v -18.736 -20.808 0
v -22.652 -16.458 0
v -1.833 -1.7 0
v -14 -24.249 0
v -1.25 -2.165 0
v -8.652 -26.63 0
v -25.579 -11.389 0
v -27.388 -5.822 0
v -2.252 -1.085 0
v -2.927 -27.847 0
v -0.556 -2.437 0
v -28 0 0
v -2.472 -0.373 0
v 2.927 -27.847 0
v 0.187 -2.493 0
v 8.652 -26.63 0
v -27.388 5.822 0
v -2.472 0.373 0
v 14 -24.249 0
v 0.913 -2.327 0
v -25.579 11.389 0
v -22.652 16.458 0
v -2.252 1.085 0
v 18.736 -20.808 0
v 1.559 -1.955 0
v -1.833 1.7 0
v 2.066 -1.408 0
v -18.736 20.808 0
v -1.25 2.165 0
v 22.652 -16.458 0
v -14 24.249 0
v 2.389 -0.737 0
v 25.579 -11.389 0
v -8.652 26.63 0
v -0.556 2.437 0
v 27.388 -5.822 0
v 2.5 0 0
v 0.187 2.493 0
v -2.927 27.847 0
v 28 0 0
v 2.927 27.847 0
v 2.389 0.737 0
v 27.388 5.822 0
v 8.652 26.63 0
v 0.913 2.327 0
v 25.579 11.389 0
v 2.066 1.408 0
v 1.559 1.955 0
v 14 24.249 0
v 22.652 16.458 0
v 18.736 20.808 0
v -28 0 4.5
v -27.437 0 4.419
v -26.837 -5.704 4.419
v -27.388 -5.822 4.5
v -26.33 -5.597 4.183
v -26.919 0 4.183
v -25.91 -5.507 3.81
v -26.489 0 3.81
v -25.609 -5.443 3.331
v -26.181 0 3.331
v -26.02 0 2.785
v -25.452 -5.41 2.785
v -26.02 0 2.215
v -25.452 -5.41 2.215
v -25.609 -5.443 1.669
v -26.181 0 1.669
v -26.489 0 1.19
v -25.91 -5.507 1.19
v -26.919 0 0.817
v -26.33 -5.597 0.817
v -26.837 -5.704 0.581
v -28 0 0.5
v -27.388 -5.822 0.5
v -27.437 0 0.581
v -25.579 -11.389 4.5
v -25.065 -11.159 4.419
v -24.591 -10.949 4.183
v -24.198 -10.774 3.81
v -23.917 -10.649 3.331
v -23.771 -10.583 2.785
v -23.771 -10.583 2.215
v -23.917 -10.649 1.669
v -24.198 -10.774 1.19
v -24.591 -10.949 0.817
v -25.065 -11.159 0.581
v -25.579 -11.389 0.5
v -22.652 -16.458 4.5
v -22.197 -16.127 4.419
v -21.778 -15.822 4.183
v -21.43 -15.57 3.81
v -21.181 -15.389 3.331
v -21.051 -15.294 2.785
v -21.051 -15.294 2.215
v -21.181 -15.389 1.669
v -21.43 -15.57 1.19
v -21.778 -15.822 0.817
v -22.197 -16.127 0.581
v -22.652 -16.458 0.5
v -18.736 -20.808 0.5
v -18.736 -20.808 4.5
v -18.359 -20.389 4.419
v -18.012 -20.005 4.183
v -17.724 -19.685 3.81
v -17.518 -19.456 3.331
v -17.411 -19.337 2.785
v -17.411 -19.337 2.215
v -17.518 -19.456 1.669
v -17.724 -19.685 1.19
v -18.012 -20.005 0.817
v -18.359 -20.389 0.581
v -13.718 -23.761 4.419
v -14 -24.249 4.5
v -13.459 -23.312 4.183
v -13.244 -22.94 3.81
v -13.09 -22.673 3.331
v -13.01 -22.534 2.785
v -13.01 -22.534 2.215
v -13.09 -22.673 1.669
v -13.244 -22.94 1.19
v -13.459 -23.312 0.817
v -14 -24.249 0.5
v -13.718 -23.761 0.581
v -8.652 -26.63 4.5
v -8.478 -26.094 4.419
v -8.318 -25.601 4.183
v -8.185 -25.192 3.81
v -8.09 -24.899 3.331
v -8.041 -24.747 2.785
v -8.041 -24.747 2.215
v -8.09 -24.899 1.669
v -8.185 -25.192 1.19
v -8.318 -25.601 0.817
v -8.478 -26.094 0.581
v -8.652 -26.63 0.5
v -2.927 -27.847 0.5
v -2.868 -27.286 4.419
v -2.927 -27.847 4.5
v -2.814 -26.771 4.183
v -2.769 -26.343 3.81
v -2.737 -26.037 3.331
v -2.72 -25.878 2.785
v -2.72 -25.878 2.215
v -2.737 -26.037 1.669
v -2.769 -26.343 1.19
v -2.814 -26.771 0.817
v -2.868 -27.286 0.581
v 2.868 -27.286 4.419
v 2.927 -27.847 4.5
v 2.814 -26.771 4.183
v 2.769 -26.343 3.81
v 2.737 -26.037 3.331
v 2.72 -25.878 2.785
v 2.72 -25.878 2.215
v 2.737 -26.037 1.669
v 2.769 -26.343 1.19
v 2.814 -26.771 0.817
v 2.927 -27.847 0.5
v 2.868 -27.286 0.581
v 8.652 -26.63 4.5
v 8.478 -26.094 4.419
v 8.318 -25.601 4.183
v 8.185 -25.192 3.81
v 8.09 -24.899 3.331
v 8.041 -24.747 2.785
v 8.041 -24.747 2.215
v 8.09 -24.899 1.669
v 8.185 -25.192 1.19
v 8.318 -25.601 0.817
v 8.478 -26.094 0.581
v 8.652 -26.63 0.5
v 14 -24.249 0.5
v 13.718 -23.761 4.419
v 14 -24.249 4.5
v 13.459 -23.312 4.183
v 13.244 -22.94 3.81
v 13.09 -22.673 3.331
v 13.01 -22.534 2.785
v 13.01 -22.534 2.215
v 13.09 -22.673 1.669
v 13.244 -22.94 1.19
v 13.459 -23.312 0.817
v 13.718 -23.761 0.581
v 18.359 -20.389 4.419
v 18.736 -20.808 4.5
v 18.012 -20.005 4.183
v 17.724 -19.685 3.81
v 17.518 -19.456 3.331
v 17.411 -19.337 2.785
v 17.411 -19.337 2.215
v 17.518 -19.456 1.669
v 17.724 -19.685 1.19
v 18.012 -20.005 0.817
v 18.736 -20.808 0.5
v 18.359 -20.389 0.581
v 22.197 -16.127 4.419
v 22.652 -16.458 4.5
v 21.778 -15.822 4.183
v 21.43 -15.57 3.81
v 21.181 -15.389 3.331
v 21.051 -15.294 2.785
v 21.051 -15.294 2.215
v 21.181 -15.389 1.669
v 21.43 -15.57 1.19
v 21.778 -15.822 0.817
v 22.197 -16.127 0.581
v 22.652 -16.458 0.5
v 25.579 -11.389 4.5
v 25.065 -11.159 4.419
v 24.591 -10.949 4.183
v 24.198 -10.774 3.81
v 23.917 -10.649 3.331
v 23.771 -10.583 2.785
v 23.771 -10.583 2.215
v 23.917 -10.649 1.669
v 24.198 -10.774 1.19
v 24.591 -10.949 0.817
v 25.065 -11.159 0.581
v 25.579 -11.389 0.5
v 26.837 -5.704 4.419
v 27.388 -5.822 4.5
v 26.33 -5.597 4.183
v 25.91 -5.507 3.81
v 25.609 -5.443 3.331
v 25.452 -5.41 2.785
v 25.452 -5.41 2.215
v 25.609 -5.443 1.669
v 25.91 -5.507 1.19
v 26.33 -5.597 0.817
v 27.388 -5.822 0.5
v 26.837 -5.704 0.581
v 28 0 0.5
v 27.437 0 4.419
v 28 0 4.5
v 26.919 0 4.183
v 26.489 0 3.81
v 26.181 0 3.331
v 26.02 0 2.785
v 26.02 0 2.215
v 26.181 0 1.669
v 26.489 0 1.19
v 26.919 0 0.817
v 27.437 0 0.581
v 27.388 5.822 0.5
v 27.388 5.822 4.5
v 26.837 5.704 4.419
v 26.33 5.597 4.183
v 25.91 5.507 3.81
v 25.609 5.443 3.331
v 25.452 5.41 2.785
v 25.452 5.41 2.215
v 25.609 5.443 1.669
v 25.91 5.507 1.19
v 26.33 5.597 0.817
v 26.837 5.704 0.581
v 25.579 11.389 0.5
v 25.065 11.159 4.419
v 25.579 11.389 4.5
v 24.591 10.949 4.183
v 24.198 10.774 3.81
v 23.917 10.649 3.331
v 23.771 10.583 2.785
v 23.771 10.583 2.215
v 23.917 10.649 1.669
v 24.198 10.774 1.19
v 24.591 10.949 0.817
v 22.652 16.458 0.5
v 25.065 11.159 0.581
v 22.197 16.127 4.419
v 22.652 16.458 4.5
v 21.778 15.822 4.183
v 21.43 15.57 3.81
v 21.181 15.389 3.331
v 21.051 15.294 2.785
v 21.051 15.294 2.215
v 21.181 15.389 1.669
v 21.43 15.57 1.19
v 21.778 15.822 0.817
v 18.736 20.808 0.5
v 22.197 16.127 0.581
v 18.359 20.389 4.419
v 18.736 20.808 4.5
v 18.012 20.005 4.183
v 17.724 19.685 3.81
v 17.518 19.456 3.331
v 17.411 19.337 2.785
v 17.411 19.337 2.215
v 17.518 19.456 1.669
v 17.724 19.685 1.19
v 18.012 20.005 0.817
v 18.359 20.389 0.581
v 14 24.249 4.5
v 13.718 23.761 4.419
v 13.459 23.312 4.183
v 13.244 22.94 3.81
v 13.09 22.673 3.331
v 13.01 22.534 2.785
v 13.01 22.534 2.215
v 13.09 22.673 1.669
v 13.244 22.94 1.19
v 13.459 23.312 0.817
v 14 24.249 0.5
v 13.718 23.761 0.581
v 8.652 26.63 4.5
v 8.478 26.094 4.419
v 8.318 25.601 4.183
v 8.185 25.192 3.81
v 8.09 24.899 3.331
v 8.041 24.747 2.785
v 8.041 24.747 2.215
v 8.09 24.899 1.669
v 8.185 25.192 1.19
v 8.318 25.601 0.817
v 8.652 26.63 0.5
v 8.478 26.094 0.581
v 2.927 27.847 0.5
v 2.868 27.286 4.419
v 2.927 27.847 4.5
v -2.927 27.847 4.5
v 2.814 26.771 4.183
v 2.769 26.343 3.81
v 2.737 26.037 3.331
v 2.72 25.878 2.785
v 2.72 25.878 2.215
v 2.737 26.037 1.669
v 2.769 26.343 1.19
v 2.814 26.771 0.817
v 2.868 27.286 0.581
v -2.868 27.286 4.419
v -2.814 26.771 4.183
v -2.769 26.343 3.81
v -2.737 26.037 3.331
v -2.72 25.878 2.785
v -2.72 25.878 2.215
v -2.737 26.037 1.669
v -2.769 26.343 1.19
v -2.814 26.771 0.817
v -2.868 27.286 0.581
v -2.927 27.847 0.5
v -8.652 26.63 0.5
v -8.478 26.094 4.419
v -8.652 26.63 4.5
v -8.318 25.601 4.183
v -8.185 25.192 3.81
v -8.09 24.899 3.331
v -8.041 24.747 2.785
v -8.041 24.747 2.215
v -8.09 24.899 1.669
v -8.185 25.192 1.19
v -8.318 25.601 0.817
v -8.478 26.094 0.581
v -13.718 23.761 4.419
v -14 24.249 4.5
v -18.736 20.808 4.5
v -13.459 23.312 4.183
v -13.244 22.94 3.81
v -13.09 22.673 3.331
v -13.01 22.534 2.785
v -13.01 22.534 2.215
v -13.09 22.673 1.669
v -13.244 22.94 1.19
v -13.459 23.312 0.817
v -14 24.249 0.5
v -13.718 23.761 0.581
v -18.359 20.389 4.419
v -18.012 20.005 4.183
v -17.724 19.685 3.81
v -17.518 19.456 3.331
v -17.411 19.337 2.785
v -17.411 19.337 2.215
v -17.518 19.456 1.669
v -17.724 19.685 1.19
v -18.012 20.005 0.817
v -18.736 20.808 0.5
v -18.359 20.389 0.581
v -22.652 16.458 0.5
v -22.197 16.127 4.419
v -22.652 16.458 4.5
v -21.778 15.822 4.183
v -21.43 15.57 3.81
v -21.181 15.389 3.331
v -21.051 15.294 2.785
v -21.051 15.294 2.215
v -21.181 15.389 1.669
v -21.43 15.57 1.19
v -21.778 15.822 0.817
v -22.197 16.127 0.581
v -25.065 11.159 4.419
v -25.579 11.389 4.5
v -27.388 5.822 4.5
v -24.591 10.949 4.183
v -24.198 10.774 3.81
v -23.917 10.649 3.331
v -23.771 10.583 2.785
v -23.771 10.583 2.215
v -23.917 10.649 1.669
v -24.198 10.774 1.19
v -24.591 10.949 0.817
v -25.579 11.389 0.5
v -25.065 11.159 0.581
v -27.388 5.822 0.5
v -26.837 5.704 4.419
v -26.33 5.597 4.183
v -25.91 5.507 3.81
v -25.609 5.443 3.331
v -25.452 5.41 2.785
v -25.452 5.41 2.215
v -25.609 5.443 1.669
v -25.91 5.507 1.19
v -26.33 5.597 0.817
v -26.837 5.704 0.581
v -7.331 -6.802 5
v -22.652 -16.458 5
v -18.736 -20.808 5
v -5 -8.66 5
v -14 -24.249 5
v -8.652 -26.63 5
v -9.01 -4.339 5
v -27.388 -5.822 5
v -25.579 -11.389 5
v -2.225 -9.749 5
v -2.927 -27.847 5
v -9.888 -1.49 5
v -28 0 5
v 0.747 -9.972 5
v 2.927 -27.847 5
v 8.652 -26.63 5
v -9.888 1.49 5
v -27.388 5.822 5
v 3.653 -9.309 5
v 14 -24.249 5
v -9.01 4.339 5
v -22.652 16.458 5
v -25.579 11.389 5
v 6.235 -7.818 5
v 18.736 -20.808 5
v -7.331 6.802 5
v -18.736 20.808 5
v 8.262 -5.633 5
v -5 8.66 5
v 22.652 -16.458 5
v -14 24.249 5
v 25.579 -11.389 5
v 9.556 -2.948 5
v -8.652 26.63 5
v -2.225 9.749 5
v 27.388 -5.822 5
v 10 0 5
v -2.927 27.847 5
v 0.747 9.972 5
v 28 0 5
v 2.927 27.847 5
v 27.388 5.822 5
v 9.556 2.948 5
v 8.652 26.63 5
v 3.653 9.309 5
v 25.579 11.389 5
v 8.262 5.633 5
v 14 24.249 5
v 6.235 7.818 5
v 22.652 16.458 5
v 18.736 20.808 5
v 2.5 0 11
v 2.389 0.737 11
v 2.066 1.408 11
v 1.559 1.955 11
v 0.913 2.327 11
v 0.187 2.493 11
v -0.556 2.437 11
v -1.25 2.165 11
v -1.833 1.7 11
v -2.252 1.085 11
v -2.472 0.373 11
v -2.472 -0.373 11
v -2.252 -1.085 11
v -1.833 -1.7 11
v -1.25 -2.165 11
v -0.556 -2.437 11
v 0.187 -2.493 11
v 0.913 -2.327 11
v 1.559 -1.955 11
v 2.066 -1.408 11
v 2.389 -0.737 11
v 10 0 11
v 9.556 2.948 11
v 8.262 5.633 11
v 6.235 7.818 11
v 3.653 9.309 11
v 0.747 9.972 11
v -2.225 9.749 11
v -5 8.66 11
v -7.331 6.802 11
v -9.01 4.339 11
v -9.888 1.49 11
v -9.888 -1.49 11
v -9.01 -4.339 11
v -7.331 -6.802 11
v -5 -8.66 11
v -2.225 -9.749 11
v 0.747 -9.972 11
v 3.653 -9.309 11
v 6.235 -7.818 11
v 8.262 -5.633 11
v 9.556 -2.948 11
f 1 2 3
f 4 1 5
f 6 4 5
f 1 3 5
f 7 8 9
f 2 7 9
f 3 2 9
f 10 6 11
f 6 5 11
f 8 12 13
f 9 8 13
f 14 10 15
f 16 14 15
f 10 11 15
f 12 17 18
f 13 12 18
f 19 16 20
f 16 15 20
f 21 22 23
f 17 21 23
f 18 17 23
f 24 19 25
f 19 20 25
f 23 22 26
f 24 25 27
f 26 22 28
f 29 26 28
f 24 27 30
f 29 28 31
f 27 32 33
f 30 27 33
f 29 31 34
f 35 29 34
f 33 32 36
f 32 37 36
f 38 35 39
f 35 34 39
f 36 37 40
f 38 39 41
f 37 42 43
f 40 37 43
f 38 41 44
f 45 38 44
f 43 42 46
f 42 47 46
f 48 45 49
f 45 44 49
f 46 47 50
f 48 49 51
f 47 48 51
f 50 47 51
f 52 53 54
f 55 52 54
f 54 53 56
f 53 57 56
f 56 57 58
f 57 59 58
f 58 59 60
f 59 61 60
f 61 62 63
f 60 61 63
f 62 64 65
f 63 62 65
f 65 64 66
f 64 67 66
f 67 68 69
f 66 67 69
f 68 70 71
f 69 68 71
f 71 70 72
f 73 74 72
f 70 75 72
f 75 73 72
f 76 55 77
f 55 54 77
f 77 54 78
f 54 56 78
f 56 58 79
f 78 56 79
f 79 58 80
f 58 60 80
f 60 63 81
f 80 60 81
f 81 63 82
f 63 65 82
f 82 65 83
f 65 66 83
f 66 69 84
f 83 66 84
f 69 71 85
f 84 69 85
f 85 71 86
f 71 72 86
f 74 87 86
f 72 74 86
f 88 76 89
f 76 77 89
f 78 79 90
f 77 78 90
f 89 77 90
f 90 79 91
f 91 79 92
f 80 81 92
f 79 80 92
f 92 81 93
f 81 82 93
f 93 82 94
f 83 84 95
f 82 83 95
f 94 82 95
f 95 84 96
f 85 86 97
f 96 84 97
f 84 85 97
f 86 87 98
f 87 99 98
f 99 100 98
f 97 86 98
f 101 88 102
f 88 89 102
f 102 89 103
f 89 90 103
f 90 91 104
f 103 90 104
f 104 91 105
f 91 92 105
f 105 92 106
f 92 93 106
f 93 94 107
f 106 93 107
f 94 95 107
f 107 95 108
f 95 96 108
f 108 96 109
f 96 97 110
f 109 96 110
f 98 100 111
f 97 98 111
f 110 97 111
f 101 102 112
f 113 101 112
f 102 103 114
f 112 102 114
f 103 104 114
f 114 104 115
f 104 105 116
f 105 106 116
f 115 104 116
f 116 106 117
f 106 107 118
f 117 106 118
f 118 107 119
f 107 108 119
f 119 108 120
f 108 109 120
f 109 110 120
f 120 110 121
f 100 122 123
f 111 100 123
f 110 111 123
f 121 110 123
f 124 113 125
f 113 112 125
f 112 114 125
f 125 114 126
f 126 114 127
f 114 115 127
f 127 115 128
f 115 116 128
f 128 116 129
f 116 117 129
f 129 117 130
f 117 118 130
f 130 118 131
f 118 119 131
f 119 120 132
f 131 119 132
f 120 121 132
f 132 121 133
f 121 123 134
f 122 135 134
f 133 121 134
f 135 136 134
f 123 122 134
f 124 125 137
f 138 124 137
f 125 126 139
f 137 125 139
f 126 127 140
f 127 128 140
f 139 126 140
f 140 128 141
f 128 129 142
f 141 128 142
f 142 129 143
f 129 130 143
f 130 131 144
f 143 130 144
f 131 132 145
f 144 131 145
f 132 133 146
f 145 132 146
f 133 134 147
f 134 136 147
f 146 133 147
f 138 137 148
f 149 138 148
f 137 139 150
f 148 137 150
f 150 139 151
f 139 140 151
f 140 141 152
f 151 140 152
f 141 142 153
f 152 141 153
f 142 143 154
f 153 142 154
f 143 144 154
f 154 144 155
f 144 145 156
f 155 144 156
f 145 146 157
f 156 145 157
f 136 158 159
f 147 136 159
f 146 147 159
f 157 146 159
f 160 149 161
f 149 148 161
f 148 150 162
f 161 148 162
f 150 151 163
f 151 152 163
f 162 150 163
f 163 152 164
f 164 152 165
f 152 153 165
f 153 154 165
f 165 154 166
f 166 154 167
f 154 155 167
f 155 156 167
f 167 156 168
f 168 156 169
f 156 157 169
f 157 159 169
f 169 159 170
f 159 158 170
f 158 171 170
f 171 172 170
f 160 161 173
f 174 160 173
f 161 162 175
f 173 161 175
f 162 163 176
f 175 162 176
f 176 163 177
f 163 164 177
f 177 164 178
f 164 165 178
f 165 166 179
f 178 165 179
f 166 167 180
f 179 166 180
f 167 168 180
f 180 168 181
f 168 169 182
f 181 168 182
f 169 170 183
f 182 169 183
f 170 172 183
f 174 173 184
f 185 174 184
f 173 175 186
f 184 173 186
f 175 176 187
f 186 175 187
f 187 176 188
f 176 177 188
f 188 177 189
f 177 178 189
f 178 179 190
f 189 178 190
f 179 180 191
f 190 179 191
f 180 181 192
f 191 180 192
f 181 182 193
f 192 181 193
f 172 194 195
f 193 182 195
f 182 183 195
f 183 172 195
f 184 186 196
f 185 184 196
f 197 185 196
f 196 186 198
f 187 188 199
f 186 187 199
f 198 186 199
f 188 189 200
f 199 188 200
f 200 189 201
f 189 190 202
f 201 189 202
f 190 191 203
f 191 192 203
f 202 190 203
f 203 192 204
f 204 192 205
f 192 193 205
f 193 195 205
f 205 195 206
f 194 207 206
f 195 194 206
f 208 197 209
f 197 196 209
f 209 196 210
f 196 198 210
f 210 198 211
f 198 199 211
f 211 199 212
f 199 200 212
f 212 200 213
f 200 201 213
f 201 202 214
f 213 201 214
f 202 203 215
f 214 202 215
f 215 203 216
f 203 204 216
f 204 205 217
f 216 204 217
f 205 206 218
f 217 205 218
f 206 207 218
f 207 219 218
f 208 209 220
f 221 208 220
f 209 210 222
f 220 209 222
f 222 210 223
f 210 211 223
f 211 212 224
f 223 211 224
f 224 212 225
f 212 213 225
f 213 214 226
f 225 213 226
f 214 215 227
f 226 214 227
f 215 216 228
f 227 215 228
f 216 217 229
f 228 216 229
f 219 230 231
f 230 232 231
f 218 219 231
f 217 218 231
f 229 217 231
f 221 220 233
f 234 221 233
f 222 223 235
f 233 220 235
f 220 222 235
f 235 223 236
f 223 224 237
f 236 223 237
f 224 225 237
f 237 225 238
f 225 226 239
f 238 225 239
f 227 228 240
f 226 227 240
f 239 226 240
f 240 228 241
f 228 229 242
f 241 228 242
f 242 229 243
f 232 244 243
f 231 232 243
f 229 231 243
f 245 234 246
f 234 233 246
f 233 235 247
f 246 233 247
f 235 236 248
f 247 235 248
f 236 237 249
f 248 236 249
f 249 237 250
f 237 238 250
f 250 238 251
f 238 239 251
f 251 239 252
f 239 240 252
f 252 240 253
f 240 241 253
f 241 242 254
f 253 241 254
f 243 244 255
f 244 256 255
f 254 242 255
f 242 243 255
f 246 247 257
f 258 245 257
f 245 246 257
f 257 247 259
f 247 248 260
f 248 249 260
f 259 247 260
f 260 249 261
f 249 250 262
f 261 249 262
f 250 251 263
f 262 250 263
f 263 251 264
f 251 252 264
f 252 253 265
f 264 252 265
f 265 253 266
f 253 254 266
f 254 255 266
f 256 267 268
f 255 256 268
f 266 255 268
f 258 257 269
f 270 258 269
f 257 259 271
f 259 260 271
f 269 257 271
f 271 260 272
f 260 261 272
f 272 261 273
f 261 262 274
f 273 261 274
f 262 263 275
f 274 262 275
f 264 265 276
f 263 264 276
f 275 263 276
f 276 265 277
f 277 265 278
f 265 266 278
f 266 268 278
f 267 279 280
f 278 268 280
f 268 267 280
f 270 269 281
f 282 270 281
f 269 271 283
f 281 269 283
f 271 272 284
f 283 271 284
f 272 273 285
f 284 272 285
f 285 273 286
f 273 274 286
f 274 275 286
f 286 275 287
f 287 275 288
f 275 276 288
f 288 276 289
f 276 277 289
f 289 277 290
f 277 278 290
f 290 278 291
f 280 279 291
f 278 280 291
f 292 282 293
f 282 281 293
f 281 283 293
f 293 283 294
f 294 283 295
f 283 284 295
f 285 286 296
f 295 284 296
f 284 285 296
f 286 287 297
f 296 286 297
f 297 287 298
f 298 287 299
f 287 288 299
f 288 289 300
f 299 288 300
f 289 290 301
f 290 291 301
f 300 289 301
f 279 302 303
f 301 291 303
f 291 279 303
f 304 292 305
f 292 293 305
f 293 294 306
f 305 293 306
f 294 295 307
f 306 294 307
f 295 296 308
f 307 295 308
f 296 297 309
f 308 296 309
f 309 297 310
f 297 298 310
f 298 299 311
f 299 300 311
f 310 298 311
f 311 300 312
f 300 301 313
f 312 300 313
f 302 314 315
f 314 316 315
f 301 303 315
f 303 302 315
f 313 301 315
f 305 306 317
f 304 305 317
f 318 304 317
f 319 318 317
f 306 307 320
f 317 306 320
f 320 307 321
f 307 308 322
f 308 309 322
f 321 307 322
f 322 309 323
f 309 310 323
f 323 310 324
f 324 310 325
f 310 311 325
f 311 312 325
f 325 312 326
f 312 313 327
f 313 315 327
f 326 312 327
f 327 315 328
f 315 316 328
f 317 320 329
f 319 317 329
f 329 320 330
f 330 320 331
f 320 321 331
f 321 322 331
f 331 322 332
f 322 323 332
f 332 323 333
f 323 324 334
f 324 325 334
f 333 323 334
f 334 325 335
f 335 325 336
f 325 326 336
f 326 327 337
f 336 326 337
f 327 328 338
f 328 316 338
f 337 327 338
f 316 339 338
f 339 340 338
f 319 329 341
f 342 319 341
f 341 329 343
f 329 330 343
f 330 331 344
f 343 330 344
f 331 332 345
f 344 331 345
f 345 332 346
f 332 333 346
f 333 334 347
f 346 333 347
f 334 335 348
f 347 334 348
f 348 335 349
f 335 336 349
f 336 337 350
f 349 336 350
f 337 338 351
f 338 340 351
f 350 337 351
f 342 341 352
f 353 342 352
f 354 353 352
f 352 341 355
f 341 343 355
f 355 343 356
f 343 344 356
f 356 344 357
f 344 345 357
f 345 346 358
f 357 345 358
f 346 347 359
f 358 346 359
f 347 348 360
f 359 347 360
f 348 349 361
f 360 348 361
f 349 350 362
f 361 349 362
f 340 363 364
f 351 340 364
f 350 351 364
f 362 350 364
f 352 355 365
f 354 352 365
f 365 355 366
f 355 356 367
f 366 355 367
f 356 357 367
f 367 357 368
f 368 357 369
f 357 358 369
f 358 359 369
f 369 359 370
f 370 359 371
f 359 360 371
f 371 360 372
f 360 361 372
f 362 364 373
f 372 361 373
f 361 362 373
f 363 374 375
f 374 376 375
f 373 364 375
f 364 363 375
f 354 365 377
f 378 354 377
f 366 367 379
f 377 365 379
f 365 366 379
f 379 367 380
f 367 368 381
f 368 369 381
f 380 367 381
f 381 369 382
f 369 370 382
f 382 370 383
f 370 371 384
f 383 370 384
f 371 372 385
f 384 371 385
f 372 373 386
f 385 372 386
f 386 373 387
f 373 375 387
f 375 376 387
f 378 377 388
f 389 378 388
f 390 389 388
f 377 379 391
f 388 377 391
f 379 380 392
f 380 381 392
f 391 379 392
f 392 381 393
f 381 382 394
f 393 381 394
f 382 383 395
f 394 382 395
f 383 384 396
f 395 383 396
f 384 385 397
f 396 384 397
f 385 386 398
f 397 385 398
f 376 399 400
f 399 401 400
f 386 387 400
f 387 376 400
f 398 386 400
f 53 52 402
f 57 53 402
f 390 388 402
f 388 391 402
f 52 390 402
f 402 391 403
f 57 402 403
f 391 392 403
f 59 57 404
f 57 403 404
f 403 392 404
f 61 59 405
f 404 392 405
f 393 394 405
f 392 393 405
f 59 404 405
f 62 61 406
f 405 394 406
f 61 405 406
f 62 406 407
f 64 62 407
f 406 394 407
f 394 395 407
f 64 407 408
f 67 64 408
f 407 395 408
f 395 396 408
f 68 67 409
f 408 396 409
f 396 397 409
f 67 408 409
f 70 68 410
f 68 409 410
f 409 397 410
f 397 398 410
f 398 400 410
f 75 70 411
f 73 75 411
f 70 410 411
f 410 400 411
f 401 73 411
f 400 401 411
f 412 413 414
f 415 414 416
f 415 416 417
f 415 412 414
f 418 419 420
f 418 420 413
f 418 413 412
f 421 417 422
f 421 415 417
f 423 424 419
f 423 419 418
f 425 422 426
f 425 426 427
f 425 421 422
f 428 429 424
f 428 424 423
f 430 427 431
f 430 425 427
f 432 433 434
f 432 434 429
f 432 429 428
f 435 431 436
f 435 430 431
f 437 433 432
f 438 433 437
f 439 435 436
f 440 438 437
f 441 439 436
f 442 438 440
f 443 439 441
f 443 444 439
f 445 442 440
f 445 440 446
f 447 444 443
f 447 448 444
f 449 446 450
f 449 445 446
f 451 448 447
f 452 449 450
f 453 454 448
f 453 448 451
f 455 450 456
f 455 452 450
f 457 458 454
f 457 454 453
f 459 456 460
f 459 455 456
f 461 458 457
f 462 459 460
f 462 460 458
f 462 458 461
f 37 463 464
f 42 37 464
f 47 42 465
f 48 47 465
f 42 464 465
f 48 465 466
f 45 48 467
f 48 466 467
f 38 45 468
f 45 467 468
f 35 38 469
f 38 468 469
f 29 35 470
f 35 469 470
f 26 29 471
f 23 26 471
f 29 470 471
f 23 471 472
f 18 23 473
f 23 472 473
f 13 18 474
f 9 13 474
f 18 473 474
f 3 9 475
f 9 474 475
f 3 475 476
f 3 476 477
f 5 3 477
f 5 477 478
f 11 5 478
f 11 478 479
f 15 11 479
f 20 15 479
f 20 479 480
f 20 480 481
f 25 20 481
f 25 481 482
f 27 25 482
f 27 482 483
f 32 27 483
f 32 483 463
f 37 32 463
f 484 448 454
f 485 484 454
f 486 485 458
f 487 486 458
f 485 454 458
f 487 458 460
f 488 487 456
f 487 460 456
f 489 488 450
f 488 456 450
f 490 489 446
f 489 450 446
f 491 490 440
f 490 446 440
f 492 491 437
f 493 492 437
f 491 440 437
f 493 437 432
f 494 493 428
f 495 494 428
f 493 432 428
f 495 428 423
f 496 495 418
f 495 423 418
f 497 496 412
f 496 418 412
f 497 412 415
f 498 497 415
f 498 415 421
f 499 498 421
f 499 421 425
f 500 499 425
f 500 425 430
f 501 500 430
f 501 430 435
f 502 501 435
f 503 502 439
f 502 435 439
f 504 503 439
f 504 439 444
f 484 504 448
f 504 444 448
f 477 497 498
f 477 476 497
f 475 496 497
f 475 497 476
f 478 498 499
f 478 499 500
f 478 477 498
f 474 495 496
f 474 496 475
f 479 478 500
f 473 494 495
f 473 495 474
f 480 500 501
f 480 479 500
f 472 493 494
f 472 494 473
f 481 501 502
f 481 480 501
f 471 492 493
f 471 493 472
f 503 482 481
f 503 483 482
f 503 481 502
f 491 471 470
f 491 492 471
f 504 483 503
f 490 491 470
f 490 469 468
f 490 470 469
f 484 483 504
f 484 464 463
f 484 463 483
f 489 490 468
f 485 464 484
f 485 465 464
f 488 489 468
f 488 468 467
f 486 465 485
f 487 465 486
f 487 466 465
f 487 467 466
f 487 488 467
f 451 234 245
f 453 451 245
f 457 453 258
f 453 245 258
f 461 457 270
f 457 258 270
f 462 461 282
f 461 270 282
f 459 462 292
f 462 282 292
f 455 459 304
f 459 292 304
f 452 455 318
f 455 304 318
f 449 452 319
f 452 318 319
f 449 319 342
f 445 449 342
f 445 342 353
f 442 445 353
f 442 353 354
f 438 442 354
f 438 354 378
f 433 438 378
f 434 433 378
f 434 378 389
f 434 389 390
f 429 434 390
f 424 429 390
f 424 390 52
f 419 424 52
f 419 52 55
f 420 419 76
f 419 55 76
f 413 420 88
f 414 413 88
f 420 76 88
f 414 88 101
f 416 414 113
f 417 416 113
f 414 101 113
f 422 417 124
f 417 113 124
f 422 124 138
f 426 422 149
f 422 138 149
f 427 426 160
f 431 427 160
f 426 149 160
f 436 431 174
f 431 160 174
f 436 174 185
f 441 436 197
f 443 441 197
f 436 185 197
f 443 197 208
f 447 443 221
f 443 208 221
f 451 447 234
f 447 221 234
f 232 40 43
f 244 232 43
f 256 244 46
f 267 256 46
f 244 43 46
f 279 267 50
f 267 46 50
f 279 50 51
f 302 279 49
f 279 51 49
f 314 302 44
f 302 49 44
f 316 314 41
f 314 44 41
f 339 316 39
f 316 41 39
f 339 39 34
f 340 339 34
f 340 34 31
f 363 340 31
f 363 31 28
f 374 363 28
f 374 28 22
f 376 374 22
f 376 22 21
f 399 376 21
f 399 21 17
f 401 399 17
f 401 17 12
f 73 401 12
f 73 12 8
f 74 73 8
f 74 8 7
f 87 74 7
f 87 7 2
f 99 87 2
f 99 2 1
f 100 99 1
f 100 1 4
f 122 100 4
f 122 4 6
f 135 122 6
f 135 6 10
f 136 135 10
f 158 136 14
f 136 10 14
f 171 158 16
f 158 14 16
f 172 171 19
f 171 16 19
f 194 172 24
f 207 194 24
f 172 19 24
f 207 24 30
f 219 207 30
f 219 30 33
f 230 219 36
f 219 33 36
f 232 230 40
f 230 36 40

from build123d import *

# Parameters (mm, degrees)
ESQUISSE1_R             = 28
BOSS_EXTRU_1_DEPTH      = 5
ESQUISSE2_R             = 10
BOSS_EXTRU_2_DEPTH      = 6
ESQUISSE3_R             = 2.5
ENL_V_MAT_EXTRU_1_DEPTH = 42.097445176
ESQUISSE4_R             = 2


with BuildPart() as part:
    # Esquisse1 → Boss.-Extru.1 (new body)
    with BuildSketch(Plane.XY):
        Circle(ESQUISSE1_R)
    extrude(amount=BOSS_EXTRU_1_DEPTH)

    # Esquisse2 → Boss.-Extru.2 (add)
    with BuildSketch(Plane.XY.offset(5)):
        Circle(ESQUISSE2_R)
    extrude(amount=BOSS_EXTRU_2_DEPTH)

    # Esquisse3 → Enlèv. mat.-Extru.1 (cut, through all)
    with BuildSketch(Plane.XY.offset(11)):
        Circle(ESQUISSE3_R)
    extrude(amount=-ENL_V_MAT_EXTRU_1_DEPTH, mode=Mode.SUBTRACT)

    # Esquisse4 → Enlèvement de matière-Révolution1 (revolve, cut)
    with BuildSketch(Plane(origin=(0, 0, 0), x_dir=(0, 0, -1), z_dir=(1, 0, 0)), mode=Mode.PRIVATE) as enl_vement_de_mati_re_r_volution1_sk:
        with Locations((-2.5, 28)):
            Circle(ESQUISSE4_R)
    revolve(enl_vement_de_mati_re_r_volution1_sk.sketch.rotate(Axis((0, 0, 0), (0, 0, 1)), 90), axis=Axis((0, 0, 0), (0, 0, 1)), mode=Mode.SUBTRACT)


solid = part.part
